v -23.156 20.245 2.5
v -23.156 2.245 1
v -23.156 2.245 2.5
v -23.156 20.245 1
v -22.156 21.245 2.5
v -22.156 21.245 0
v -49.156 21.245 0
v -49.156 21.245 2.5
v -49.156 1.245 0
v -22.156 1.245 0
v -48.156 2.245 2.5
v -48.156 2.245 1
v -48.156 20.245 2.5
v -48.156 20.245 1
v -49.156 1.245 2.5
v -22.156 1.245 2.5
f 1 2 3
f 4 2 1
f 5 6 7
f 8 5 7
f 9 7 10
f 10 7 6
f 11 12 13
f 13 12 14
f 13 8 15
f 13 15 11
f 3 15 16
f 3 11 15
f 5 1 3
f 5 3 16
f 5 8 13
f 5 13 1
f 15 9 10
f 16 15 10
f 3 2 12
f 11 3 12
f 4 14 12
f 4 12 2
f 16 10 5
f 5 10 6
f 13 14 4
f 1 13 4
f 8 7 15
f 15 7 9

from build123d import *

# Parameters (mm, degrees)
F0_W     = 25
F0_H     = 18
F1_DEPTH = 1
F0_W_2   = 1
F2_DEPTH = 2.5


with BuildPart() as f1:
    # F0 (on Top) → F1 (new body)
    with BuildSketch(Plane.XY):
        with Locations((-35.655684, 11.245334)):
            Rectangle(F0_W, F0_H)
    extrude(amount=F1_DEPTH)

    # F0 (on Top) → F2 (join)
    with BuildSketch(Plane.XY):
        Polygon((-49.155684, 20.245334), (-48.155684, 20.245334), (-23.155684, 20.245334), (-22.155684, 20.245334), (-22.155684, 21.245334), (-49.155684, 21.245334), align=None)
        Polygon((-23.155684, 2.245334), (-48.155684, 2.245334), (-49.155684, 2.245334), (-49.155684, 1.245334), (-22.155684, 1.245334), (-22.155684, 2.245334), align=None)
        with Locations((-48.655684, 11.245334)):
            Rectangle(F0_W_2, F0_H)
        with Locations((-22.655684, 11.245334)):
            Rectangle(F0_W_2, F0_H)
    extrude(amount=F2_DEPTH)


solid = f1.part
